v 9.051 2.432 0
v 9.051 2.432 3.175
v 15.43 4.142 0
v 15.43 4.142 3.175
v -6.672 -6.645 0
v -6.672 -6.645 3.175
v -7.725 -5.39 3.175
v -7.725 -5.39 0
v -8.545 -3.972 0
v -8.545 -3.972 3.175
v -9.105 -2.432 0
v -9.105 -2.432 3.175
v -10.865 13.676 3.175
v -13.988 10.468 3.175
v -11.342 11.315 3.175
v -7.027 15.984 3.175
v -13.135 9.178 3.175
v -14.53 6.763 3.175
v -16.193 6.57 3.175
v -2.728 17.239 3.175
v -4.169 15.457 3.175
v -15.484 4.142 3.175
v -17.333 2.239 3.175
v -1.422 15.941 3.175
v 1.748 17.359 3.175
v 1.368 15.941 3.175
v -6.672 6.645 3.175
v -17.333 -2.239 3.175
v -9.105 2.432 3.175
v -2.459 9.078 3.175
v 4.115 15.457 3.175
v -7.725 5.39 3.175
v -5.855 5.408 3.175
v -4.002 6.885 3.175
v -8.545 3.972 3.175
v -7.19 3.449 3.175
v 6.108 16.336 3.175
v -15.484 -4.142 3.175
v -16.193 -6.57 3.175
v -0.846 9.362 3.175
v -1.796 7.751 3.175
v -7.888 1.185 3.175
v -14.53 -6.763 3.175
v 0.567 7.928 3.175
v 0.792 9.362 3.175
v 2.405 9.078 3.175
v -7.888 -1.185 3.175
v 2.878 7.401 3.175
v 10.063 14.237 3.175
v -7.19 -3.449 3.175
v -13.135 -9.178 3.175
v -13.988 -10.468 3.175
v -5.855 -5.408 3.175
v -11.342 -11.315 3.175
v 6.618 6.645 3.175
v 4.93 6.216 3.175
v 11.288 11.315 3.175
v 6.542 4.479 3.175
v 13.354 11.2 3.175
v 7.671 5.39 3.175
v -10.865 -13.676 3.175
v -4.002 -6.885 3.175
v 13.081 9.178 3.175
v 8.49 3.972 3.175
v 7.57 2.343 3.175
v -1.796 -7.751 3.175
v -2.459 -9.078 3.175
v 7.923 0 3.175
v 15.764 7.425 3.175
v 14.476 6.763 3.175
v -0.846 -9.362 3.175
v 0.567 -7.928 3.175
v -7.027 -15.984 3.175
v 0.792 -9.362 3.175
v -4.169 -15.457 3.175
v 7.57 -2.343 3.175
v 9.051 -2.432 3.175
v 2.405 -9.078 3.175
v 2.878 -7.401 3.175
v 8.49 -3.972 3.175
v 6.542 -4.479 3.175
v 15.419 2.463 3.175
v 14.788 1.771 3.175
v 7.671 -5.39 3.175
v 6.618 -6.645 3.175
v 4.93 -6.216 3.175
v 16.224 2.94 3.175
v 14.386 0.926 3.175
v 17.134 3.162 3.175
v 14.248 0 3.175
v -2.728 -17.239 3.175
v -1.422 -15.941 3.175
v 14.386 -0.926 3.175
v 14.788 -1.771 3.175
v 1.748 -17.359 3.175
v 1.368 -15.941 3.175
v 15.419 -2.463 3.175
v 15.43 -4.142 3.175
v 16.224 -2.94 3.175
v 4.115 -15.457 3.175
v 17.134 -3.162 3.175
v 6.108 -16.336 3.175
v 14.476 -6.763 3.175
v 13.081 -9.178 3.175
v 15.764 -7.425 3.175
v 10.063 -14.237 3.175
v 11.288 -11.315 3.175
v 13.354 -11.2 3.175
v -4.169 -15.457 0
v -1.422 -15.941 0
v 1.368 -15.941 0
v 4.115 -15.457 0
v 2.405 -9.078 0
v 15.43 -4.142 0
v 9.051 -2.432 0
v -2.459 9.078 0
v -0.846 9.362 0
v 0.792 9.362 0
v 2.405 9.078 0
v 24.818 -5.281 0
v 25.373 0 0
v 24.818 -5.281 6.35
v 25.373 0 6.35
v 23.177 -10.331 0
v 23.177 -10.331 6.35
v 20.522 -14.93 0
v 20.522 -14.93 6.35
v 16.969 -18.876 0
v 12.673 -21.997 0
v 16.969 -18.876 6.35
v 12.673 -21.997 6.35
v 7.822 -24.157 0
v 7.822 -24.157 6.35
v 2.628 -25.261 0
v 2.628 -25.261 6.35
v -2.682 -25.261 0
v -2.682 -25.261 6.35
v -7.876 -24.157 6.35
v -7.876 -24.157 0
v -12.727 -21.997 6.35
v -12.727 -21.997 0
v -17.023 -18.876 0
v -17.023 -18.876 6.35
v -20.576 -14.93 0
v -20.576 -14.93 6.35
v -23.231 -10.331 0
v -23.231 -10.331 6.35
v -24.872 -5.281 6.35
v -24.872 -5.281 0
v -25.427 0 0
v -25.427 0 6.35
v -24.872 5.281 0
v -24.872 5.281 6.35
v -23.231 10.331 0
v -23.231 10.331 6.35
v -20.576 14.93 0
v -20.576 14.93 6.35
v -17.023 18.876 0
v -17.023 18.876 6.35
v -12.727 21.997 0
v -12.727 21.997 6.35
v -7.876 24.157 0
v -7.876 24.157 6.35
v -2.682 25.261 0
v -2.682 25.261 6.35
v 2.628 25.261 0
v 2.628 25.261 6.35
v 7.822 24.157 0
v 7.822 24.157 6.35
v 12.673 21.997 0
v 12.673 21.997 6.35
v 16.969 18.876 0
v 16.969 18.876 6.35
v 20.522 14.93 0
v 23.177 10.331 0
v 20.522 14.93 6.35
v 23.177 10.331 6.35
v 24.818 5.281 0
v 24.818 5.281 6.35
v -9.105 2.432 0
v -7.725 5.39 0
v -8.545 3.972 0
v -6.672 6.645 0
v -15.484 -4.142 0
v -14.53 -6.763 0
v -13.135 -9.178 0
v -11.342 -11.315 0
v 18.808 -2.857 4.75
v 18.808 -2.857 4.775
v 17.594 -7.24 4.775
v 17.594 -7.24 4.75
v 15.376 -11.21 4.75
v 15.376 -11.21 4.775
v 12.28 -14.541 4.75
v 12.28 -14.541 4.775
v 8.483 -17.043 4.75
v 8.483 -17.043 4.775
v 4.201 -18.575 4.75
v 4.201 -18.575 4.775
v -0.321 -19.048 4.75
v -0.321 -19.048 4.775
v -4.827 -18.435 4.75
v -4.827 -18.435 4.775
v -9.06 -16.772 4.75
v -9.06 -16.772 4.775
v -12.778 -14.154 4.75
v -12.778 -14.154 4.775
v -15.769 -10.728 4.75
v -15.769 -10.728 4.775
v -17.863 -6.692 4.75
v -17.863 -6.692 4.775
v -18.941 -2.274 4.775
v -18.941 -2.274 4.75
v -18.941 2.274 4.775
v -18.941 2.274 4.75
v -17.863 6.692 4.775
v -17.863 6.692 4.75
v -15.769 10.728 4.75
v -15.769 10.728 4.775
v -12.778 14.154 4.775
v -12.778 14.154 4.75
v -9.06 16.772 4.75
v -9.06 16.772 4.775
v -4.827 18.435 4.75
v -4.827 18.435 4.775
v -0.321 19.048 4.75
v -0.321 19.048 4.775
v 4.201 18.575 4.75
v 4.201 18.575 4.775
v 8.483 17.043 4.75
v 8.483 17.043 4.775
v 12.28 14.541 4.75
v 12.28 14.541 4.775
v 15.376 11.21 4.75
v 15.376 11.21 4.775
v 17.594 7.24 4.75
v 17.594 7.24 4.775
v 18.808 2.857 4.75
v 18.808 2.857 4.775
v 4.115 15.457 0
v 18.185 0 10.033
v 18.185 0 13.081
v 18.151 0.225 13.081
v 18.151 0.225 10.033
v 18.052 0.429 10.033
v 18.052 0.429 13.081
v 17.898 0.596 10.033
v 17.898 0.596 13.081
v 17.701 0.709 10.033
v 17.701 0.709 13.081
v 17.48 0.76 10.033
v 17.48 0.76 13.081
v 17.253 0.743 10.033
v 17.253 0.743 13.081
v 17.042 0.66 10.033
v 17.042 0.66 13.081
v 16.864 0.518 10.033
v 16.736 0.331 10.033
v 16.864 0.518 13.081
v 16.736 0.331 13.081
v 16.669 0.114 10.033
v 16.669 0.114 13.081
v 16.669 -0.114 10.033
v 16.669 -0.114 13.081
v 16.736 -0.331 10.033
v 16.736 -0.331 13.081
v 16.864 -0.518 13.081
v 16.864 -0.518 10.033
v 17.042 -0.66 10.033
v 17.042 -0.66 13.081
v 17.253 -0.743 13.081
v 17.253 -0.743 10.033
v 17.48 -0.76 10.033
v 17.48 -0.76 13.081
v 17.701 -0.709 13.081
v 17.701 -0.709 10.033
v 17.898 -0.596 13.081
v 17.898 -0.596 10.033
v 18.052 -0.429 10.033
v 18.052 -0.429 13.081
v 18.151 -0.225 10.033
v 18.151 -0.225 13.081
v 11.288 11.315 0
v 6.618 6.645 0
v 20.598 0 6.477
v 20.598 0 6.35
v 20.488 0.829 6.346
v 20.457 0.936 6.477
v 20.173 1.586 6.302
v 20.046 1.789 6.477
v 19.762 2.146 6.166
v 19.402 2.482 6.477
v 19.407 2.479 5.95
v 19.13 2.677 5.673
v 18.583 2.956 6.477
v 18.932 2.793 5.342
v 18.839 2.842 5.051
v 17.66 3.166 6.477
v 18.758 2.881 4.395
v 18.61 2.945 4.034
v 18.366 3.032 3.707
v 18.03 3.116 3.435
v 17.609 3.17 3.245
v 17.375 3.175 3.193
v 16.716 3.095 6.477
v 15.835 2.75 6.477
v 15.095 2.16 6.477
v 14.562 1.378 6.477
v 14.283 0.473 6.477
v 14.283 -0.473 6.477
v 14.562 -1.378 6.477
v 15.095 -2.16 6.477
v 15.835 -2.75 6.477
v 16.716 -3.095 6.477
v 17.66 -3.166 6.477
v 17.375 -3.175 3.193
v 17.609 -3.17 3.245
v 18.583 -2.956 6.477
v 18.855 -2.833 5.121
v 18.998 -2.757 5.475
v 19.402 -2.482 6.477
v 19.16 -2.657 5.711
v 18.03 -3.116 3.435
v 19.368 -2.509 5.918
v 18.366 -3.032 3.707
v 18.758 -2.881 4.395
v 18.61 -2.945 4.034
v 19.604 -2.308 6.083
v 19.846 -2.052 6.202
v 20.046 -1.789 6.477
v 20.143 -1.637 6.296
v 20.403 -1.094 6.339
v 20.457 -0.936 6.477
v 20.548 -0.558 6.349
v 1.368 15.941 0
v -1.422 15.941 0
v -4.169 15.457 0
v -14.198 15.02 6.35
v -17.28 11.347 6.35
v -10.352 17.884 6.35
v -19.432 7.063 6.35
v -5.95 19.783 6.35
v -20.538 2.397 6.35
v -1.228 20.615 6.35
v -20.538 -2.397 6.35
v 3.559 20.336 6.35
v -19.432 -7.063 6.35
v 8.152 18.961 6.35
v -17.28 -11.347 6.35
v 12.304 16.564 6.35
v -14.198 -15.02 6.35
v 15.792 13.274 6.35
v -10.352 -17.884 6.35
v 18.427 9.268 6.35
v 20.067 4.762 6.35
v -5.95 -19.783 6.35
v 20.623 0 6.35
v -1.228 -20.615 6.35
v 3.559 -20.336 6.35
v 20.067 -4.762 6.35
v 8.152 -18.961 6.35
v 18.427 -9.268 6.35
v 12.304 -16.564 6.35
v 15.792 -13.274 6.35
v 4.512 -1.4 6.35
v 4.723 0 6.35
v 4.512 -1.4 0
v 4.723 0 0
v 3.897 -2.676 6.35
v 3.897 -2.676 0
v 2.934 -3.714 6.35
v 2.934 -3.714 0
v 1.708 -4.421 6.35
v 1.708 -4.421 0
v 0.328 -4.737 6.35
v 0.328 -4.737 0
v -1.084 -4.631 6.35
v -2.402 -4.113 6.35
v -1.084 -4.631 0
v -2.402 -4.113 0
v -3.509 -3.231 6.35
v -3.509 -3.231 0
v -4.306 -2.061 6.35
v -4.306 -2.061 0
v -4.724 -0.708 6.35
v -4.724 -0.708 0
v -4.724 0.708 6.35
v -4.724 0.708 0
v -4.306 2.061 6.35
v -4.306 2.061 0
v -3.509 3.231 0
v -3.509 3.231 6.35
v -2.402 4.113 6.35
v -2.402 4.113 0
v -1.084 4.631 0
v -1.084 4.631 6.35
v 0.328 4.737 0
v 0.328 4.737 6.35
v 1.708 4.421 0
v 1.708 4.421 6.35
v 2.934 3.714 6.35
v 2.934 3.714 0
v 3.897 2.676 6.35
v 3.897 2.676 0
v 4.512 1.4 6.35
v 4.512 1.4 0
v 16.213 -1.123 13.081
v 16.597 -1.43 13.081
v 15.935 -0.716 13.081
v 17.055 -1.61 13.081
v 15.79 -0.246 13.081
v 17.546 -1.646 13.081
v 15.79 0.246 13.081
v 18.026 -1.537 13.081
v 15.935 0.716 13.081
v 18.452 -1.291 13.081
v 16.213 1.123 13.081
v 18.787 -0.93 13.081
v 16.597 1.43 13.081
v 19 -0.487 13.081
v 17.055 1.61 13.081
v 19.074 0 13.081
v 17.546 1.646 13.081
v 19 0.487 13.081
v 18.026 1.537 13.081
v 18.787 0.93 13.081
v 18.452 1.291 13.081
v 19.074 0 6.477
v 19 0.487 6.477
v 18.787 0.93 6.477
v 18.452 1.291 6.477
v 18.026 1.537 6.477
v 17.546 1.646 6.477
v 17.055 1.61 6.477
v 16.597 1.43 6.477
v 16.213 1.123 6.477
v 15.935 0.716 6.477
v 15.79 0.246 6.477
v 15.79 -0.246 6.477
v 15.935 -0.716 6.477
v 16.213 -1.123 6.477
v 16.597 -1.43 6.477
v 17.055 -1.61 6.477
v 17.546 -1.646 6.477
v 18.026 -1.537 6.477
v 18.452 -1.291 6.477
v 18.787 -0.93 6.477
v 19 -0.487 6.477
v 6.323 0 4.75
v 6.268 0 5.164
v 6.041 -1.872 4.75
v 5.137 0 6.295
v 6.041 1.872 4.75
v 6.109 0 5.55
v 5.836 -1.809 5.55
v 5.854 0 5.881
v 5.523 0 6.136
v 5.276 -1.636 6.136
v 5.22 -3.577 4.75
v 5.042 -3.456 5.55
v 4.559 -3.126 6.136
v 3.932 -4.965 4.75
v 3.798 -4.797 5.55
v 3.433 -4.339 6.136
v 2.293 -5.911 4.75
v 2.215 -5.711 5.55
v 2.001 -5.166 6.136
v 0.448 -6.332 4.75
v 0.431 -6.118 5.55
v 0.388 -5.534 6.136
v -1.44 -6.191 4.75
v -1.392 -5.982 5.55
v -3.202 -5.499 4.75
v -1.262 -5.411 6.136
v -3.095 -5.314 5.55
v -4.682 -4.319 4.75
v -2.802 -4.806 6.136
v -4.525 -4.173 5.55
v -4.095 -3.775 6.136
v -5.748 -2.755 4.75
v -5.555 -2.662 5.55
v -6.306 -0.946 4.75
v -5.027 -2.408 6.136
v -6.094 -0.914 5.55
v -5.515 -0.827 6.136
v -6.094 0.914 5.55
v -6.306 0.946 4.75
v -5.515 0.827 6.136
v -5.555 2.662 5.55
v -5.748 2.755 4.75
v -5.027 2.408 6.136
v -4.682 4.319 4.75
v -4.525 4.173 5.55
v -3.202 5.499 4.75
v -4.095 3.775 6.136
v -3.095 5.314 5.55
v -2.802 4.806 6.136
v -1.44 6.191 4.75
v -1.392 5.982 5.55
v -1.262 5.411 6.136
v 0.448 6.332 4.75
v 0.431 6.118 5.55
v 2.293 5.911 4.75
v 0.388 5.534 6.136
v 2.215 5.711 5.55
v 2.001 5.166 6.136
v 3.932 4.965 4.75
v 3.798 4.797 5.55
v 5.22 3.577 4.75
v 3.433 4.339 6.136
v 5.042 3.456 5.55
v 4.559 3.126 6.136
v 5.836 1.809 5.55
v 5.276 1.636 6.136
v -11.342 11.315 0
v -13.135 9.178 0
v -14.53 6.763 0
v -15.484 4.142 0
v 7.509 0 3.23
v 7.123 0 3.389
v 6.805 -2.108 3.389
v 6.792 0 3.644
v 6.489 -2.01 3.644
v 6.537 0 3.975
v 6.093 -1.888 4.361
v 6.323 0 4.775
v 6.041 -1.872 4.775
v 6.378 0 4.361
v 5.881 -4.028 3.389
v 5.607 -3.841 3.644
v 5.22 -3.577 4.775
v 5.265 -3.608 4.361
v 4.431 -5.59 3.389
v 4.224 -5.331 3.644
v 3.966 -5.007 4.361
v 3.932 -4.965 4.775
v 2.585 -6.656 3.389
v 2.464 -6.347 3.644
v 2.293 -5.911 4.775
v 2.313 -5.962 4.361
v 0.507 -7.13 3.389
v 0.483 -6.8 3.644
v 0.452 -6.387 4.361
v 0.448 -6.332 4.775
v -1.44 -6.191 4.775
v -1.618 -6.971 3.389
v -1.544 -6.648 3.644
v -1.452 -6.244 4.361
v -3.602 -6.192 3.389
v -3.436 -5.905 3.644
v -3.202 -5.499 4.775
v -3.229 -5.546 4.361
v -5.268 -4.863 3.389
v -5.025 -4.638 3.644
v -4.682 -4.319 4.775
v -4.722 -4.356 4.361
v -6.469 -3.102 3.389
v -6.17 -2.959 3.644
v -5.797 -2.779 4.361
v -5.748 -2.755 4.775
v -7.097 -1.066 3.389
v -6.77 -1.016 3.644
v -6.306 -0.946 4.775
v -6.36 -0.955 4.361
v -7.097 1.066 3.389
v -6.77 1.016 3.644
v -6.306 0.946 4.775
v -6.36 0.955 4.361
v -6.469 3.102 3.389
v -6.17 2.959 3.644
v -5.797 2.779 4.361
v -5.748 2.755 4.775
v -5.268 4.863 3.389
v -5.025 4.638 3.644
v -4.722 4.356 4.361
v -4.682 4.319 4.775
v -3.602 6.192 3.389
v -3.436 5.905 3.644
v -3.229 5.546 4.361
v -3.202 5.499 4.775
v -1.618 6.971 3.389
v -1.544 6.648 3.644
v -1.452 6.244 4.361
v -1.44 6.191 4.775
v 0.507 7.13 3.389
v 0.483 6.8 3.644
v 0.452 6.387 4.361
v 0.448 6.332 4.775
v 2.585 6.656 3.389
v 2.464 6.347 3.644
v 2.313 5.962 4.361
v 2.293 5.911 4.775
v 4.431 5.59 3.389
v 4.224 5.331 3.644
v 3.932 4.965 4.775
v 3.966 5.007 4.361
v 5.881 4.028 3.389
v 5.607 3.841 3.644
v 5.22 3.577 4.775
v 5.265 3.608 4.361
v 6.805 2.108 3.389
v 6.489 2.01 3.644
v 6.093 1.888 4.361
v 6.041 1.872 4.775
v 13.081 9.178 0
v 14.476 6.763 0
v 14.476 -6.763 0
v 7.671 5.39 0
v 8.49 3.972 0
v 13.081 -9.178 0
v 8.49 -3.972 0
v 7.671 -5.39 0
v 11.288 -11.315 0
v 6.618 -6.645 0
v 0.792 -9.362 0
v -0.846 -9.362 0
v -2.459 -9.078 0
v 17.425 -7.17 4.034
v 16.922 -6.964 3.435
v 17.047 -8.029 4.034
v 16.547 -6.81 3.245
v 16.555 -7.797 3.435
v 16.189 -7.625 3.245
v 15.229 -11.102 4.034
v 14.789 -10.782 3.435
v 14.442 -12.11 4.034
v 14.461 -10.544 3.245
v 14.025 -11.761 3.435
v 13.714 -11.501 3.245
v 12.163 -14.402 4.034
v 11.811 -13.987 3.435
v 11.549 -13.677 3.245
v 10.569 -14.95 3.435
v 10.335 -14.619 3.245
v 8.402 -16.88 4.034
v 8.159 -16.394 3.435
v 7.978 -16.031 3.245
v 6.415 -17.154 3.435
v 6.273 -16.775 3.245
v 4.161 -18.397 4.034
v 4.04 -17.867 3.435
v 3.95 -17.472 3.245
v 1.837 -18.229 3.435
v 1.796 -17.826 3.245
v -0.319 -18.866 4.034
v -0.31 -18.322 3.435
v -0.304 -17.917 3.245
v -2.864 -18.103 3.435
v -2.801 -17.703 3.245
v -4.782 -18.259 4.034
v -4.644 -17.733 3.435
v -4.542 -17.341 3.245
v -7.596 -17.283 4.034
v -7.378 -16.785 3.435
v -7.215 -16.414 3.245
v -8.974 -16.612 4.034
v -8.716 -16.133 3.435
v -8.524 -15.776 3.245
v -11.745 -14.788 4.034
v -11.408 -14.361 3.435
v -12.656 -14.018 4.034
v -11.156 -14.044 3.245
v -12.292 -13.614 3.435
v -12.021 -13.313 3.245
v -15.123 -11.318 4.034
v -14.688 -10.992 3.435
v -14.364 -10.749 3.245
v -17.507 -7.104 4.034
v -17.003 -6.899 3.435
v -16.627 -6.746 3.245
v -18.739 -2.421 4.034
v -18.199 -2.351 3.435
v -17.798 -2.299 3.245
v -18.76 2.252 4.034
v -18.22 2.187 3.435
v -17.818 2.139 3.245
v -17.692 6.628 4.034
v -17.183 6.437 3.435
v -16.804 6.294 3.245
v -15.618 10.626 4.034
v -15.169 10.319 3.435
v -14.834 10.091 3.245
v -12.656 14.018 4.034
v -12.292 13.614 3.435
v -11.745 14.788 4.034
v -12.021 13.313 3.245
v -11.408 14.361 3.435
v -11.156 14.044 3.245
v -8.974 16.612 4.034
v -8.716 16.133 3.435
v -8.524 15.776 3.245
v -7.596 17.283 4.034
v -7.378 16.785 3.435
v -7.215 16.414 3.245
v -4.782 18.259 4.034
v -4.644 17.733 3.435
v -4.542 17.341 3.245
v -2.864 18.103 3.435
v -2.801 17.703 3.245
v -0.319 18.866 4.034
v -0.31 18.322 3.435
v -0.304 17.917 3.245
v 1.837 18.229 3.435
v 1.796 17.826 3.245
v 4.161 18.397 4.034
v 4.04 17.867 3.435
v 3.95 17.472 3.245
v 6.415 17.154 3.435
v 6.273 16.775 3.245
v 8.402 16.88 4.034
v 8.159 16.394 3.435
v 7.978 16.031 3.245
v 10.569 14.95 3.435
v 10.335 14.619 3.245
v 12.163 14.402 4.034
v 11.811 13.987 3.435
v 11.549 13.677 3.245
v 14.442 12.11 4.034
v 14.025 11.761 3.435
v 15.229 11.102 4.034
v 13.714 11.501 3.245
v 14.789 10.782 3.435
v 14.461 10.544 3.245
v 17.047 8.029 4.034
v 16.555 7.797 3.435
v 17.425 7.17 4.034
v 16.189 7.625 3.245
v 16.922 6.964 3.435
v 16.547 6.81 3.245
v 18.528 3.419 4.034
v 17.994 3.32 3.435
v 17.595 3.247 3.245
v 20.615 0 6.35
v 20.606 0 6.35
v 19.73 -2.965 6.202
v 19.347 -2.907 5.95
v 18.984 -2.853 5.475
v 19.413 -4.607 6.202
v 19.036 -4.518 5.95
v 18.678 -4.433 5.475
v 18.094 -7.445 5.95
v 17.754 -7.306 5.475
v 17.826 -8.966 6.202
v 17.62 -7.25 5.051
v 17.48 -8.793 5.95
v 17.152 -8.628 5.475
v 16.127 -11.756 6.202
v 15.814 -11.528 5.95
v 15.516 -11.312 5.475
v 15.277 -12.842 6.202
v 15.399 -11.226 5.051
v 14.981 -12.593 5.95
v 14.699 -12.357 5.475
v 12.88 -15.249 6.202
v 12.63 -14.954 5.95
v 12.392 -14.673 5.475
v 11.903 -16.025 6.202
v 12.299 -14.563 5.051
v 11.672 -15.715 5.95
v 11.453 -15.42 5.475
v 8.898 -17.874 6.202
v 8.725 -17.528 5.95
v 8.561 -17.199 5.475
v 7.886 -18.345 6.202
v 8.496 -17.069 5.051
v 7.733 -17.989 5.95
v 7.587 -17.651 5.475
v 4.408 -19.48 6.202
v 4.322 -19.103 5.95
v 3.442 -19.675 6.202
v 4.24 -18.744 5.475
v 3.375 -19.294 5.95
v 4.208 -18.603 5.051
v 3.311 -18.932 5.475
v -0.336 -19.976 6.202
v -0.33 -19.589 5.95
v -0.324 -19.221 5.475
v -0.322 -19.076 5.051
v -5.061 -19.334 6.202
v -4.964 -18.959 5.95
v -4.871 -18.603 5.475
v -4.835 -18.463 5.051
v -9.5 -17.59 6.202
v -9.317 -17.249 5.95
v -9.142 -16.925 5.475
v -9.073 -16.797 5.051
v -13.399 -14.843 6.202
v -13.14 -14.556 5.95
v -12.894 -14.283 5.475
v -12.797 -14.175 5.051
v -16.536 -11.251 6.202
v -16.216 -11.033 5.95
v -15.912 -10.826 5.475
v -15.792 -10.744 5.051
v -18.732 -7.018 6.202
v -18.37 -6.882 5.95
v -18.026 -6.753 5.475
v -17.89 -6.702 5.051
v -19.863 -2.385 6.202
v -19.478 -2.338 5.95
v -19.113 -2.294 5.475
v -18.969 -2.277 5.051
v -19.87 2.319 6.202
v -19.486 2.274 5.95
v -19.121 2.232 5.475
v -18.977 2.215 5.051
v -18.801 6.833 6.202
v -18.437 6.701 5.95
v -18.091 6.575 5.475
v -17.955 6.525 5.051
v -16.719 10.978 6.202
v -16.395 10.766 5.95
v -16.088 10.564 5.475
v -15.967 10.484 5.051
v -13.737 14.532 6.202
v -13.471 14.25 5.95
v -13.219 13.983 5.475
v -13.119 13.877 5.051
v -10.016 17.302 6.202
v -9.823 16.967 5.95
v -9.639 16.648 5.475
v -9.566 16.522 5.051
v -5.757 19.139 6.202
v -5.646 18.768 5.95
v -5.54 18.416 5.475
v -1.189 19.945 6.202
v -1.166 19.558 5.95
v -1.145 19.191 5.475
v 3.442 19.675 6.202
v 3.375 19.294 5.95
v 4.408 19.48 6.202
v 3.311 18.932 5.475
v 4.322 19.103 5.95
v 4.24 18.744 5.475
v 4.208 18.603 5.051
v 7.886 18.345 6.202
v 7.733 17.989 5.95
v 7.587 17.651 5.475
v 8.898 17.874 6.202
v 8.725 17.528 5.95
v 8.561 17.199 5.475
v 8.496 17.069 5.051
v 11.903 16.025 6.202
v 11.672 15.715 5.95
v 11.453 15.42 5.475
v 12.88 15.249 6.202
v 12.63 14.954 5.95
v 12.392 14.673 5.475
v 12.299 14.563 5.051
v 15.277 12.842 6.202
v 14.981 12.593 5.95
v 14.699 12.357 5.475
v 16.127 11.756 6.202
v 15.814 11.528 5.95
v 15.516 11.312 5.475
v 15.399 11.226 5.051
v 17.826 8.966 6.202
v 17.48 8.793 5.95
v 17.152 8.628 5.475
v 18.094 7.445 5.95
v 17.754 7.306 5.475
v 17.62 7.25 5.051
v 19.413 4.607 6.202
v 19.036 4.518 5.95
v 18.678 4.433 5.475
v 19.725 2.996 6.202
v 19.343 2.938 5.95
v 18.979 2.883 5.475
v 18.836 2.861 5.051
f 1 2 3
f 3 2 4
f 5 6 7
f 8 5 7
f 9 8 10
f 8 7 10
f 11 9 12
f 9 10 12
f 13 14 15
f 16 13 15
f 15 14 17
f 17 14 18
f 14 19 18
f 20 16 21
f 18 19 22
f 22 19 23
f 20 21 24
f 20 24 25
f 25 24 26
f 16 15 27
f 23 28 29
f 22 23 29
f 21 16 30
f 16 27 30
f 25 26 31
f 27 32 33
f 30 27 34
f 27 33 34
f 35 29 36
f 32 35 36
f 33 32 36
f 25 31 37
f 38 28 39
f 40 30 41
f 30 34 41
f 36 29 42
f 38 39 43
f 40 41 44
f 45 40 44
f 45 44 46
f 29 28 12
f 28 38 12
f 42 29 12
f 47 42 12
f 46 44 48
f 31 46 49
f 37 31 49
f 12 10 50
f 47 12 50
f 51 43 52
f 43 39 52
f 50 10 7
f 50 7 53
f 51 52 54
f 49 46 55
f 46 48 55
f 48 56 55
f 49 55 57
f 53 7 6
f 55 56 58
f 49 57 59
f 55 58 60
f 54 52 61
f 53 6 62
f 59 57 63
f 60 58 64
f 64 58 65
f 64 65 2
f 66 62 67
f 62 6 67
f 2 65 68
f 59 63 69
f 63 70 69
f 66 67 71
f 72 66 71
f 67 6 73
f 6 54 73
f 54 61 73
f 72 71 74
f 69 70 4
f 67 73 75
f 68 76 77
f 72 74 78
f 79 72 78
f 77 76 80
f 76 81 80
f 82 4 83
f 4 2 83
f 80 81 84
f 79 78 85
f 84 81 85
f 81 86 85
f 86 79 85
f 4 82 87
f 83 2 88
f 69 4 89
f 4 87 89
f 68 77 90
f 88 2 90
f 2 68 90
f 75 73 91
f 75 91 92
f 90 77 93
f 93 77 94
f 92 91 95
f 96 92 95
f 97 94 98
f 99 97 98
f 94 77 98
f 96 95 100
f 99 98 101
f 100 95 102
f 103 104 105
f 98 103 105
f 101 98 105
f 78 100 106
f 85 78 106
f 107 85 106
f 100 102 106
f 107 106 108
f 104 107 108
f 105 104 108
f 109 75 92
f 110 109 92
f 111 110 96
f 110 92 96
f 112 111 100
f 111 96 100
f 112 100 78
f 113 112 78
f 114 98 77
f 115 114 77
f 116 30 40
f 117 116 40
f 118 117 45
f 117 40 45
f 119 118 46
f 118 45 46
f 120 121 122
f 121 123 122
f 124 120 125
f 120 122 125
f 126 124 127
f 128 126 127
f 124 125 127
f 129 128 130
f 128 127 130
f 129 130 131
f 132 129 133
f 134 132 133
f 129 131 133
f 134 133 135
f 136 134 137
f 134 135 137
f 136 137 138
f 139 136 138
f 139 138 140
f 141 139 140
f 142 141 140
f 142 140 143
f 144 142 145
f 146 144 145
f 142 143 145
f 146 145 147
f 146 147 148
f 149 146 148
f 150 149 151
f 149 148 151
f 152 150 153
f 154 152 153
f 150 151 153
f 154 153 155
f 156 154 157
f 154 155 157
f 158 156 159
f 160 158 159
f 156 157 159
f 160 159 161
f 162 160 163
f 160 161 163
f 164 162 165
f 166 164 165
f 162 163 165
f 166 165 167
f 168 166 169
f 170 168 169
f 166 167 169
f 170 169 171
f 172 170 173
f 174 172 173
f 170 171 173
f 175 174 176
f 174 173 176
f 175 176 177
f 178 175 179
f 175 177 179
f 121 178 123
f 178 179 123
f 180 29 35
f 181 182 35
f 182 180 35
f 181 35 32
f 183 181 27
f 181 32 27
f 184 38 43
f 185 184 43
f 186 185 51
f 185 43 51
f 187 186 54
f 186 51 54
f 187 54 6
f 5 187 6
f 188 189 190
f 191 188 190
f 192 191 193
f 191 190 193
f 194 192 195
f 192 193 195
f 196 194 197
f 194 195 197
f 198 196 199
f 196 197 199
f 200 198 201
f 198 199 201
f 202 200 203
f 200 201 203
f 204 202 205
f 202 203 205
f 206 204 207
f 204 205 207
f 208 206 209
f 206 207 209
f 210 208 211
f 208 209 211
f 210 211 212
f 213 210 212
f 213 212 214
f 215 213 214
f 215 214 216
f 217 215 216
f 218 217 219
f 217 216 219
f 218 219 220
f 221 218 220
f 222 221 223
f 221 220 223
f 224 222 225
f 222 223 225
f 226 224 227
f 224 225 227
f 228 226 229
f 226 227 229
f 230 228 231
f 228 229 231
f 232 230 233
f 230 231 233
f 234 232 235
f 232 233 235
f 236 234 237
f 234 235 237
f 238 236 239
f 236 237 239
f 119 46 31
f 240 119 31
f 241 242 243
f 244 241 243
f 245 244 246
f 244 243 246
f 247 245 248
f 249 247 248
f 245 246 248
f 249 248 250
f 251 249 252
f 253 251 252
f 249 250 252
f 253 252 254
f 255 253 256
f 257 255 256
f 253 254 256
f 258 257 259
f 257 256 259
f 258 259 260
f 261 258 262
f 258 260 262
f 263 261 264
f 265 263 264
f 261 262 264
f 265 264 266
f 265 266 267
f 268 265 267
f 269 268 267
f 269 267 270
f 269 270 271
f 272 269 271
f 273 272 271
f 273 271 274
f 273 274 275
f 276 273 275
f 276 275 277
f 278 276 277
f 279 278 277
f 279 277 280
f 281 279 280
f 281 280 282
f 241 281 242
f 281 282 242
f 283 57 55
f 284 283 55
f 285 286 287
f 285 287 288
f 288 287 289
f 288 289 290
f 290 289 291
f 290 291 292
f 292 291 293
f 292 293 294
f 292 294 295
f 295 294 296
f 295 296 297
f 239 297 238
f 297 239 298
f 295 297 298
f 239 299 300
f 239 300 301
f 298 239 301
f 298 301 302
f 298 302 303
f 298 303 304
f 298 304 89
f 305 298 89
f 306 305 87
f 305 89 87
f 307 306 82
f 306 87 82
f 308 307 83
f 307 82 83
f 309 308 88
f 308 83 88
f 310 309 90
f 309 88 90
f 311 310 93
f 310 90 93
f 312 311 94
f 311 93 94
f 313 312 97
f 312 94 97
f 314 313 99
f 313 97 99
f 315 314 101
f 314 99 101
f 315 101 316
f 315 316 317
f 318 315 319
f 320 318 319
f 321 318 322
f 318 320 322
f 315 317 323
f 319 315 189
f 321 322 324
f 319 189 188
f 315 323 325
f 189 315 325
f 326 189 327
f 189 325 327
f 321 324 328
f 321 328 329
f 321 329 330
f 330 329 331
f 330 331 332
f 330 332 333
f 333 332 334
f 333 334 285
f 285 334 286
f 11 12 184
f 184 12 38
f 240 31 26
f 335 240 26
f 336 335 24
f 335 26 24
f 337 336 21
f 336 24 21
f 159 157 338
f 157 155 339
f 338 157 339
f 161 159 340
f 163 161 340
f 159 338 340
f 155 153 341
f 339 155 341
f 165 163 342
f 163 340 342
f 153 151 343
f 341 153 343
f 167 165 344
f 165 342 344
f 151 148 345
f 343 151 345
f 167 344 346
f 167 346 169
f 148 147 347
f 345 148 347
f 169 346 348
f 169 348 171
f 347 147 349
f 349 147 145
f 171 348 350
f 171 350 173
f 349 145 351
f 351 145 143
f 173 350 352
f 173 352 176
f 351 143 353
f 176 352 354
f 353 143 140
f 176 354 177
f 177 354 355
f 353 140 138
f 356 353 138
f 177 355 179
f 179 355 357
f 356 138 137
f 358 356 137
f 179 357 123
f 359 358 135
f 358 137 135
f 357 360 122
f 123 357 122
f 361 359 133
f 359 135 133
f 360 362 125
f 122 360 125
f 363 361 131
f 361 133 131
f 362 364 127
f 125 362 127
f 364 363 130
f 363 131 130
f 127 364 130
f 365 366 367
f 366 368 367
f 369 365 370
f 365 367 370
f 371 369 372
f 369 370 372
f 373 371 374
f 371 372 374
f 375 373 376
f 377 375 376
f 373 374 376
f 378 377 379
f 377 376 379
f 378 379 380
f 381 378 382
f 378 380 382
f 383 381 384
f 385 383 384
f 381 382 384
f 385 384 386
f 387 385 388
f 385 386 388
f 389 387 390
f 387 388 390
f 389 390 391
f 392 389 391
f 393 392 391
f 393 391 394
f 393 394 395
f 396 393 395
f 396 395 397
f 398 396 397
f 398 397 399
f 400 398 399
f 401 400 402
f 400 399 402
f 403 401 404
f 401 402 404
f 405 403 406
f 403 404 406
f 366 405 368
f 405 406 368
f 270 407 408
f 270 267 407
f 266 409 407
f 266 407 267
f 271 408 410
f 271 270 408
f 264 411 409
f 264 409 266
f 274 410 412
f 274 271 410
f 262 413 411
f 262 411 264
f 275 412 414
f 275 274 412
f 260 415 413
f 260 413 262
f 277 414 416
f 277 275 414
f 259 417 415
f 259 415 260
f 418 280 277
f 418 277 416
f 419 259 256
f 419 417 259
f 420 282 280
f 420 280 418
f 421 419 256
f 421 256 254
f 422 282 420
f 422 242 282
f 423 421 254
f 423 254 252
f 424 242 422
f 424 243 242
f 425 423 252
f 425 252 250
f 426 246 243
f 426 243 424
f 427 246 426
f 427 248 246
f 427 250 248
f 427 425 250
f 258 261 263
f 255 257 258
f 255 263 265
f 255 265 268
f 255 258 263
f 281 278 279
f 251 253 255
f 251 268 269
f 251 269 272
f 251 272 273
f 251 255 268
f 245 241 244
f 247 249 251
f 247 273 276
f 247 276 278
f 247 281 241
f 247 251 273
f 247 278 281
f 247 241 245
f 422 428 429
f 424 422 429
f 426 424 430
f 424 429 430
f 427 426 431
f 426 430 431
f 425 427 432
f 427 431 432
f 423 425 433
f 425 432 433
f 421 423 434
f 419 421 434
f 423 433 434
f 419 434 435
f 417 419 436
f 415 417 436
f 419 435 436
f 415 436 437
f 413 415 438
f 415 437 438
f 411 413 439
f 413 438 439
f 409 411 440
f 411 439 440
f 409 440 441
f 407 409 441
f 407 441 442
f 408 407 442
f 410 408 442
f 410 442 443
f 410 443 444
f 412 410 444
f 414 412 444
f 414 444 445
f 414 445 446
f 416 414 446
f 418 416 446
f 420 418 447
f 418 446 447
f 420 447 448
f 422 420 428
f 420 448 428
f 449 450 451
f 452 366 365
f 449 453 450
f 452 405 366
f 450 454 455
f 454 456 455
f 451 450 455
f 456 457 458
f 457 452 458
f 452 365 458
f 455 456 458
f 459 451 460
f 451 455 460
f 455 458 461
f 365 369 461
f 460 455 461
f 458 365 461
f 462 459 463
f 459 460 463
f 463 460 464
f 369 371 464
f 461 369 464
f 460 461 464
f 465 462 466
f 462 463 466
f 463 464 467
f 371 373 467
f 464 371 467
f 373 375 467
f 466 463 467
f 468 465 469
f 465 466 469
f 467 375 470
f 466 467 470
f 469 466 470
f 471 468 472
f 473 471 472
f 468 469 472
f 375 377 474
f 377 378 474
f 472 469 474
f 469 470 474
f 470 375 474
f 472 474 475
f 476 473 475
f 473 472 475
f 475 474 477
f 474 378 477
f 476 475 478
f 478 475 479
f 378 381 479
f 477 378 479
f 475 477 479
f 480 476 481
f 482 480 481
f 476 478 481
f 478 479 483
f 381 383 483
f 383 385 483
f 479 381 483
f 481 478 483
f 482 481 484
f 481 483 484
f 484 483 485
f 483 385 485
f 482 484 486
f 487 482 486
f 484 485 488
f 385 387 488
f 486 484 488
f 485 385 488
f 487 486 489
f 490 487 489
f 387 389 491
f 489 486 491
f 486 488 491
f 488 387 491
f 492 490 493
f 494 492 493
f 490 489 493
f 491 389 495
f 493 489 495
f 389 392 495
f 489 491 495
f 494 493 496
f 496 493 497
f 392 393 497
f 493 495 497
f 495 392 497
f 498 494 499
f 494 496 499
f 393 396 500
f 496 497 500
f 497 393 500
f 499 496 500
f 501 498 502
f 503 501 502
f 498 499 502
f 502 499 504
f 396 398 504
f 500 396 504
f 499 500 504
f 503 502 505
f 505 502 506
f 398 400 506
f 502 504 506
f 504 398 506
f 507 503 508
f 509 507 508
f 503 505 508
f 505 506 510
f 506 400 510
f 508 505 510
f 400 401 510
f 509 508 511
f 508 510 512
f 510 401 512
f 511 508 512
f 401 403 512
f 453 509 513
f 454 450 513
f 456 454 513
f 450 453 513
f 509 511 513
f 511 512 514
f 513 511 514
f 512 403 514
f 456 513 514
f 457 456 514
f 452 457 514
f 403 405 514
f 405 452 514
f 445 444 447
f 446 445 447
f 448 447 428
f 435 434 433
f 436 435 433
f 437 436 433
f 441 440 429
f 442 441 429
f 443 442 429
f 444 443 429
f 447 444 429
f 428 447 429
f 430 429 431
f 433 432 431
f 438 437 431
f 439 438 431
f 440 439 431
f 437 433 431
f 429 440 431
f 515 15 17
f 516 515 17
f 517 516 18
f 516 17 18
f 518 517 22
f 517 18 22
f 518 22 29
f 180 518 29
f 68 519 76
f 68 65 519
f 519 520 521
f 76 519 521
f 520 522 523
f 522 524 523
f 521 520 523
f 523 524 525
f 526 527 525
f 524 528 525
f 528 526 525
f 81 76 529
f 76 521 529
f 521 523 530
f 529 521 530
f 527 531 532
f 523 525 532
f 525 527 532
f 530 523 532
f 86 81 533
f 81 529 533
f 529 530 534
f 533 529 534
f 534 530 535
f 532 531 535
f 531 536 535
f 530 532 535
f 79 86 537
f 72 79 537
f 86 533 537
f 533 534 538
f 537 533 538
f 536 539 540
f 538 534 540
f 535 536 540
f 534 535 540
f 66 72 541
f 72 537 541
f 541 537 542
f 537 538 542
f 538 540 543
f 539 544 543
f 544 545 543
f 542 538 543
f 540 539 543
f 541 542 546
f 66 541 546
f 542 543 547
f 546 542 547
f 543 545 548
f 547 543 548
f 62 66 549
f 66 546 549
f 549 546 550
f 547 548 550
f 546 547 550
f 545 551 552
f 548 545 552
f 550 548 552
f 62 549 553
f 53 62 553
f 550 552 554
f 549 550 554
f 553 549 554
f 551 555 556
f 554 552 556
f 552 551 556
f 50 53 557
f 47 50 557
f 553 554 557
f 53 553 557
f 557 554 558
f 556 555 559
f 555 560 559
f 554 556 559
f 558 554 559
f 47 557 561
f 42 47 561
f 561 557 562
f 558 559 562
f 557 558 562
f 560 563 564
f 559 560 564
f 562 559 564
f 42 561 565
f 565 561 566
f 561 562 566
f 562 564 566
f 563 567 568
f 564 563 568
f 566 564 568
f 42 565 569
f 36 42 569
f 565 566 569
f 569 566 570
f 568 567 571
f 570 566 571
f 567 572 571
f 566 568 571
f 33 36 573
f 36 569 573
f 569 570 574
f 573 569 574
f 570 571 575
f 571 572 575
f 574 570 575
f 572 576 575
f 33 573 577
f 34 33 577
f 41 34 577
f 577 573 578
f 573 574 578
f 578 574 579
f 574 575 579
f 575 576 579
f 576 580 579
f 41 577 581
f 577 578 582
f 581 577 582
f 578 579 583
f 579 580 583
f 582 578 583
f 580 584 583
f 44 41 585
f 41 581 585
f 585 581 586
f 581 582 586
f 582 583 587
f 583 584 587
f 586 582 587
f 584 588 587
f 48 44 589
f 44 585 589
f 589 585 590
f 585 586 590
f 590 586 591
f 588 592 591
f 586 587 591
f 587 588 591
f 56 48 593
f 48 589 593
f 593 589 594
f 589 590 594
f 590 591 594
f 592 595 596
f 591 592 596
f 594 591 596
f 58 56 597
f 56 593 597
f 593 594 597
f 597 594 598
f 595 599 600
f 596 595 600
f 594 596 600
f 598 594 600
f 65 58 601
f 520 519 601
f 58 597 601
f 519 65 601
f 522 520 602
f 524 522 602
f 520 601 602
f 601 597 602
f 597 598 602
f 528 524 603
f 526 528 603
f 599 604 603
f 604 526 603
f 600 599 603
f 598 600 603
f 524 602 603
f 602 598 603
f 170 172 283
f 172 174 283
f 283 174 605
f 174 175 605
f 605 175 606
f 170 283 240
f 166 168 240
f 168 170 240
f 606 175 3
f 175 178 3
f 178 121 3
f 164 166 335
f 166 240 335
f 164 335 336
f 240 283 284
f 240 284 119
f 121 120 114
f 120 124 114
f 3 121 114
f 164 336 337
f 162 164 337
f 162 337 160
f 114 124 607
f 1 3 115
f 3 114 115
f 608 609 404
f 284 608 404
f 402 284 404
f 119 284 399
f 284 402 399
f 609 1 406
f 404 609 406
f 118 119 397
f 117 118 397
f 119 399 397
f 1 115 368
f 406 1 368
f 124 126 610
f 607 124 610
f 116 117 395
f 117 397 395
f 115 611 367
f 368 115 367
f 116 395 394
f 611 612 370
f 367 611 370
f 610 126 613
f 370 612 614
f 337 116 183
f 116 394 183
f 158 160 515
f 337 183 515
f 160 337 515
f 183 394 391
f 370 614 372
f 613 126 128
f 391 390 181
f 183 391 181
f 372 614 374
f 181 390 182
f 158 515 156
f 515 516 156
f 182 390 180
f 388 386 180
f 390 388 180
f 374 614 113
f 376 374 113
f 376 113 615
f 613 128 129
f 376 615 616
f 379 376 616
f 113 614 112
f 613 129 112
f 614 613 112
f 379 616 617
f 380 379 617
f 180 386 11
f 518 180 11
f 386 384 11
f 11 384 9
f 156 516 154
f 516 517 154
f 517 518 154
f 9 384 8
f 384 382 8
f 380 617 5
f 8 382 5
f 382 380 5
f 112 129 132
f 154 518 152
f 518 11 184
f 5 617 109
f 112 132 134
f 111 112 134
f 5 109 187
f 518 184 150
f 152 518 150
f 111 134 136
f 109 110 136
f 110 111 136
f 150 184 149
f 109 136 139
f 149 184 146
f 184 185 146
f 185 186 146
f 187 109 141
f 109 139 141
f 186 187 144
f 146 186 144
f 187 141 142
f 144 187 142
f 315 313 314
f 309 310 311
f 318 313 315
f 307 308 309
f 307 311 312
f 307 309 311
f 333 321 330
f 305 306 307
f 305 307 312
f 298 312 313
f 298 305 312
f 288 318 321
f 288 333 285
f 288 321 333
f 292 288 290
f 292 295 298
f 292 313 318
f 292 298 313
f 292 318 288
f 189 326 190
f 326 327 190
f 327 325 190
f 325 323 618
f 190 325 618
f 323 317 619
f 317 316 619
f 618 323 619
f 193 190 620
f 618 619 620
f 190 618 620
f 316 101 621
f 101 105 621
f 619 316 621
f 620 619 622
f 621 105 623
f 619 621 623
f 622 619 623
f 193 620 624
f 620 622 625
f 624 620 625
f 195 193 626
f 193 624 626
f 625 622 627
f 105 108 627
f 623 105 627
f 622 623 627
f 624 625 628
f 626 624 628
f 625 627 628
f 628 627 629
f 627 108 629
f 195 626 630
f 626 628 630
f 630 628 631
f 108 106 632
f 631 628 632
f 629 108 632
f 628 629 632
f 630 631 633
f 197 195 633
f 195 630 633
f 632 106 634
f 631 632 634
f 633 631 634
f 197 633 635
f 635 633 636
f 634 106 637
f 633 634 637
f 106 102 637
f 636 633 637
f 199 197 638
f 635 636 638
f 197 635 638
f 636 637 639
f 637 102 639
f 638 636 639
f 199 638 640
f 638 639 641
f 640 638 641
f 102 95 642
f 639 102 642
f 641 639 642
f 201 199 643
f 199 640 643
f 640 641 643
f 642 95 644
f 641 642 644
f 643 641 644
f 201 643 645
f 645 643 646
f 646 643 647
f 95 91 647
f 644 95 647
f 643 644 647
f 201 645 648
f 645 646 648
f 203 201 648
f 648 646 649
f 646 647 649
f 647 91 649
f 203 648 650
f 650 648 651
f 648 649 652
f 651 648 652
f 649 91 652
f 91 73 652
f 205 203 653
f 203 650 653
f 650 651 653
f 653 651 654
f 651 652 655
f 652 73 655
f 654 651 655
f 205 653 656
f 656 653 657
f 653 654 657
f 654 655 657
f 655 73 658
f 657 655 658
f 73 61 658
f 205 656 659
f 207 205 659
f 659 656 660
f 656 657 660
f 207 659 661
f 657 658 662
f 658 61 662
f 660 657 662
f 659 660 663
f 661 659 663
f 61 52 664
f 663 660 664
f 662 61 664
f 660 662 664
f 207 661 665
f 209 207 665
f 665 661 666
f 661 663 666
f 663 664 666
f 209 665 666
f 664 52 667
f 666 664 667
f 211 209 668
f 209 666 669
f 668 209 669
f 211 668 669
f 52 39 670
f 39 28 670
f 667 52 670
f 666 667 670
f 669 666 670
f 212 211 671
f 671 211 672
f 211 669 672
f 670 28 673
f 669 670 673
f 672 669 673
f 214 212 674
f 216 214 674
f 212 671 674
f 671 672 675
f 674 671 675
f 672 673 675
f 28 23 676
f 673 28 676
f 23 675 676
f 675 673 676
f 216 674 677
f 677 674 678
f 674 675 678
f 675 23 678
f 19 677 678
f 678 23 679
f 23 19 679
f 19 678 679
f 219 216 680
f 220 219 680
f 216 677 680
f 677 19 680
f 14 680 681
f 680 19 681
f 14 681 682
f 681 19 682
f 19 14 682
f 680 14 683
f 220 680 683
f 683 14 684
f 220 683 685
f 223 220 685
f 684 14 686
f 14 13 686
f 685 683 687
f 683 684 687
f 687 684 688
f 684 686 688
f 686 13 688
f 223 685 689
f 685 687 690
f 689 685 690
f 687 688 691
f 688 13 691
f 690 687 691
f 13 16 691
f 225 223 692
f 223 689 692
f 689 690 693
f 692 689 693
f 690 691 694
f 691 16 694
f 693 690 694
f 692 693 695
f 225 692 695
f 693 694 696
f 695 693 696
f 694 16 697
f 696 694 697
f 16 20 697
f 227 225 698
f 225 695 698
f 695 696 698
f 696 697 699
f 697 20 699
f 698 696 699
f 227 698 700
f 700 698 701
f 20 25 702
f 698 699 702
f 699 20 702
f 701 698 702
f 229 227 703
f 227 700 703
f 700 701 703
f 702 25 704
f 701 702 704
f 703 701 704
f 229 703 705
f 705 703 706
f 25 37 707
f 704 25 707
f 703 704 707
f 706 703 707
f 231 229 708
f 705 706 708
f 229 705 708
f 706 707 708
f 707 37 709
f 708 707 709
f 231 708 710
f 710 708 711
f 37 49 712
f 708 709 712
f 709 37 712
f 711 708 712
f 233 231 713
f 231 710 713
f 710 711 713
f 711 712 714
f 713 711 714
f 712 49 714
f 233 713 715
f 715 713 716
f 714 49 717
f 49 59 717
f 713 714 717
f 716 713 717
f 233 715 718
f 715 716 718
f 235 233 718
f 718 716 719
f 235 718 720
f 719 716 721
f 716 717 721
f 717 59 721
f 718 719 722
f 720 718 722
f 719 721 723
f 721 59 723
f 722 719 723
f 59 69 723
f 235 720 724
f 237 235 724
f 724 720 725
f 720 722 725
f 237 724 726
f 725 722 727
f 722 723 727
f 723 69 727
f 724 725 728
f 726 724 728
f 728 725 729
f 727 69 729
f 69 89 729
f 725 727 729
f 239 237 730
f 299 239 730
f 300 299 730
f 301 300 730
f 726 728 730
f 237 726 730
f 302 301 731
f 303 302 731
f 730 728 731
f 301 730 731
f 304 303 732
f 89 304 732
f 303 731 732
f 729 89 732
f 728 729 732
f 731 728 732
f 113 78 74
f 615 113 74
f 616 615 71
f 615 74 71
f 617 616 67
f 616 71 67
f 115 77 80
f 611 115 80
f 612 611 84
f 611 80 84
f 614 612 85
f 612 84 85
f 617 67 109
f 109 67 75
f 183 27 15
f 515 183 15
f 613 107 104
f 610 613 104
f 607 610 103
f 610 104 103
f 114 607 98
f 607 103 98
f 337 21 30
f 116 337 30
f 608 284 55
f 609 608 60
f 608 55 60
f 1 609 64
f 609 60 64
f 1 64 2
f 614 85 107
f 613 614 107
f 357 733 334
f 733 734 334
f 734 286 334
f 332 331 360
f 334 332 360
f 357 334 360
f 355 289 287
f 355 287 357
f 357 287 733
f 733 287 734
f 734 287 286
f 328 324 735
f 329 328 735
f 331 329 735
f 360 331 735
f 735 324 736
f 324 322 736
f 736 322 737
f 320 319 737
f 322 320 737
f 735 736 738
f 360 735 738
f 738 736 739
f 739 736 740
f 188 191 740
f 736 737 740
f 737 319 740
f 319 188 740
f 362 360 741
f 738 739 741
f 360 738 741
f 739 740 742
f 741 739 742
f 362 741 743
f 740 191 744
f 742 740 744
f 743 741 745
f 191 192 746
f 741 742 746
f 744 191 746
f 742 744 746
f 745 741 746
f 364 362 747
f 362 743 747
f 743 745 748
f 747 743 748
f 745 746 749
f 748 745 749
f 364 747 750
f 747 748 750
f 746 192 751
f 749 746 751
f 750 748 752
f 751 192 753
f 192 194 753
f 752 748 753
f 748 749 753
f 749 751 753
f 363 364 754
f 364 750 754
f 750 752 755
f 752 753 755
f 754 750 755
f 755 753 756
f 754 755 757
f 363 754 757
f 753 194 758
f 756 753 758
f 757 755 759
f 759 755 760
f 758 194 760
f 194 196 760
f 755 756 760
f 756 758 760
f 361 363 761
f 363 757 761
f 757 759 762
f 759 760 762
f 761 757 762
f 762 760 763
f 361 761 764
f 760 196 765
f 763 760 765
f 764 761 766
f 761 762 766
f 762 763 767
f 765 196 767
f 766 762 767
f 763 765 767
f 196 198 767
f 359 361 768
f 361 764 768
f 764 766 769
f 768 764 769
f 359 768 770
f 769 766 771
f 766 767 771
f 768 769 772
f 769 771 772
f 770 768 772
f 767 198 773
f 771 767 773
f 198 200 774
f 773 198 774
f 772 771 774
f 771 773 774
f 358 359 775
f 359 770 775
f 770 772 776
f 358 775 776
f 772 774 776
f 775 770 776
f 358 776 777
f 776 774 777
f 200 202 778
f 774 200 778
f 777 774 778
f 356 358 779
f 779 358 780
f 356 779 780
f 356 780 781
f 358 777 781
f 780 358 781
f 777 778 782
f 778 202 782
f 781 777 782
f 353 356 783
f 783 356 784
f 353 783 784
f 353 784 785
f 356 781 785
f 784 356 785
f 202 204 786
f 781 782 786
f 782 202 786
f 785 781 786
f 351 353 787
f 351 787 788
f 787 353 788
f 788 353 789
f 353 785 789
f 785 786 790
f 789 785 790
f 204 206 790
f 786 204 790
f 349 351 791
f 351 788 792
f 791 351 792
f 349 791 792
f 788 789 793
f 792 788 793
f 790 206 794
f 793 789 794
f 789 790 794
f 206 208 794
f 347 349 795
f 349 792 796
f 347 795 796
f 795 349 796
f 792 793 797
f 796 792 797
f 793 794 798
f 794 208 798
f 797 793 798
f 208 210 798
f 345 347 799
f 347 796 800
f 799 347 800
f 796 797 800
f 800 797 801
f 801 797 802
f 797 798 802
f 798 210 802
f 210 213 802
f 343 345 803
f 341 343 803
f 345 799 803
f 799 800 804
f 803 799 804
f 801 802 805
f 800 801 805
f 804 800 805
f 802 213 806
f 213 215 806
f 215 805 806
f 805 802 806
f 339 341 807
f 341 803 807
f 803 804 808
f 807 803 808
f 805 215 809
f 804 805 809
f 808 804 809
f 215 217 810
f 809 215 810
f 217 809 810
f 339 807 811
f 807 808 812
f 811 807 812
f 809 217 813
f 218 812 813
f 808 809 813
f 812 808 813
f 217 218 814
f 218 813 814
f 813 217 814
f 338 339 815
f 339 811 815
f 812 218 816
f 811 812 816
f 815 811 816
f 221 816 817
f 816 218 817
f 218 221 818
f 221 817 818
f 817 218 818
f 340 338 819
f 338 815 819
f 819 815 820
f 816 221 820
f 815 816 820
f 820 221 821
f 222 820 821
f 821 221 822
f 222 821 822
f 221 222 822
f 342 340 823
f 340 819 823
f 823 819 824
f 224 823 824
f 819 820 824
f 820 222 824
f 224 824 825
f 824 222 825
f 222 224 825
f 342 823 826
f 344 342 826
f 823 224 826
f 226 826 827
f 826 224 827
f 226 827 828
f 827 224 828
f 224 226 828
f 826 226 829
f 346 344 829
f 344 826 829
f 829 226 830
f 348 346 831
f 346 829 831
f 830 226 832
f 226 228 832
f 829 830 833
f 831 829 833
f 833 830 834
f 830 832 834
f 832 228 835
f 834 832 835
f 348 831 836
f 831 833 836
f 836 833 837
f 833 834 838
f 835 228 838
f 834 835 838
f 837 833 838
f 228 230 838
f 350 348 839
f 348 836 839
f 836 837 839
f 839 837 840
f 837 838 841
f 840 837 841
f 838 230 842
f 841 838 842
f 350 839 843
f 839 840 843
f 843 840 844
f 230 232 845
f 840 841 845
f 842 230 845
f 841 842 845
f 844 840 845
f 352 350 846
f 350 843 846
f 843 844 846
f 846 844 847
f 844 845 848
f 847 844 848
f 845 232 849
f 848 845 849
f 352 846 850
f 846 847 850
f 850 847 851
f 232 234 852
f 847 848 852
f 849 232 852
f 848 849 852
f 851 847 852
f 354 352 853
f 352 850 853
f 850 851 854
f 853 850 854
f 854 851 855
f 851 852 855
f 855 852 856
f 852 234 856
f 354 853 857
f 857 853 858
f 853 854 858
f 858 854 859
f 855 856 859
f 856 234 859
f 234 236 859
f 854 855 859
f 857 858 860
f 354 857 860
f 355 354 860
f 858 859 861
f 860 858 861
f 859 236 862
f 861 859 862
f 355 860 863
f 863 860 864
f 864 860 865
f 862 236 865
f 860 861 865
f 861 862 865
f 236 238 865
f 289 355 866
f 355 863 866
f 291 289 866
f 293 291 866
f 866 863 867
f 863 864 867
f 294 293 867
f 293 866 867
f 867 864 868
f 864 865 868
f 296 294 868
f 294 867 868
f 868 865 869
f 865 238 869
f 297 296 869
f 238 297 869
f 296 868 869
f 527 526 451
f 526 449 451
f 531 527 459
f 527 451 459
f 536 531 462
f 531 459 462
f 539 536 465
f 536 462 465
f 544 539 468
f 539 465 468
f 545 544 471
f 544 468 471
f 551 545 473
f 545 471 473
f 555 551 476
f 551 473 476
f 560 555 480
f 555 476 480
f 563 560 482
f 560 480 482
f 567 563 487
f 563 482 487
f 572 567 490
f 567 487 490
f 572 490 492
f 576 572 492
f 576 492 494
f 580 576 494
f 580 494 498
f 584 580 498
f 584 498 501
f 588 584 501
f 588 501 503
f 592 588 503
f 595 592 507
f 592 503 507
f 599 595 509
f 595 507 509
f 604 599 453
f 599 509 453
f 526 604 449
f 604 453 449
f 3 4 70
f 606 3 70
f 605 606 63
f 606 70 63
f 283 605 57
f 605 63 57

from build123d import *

# Parameters (mm, degrees)
F3_DEPTH  = 25.4
F5_R      = 3.175
F6_DEPTH  = 3.302
F7_R      = 1.651
F8_DEPTH  = 6.604
F9_R      = 0.762
F10_DEPTH = 3.048


with BuildPart() as f1:
    # F0 (on Front) → F1 (revolve)
    with BuildSketch(Plane.XZ):
        with BuildLine():
            Line((8.5327767238, 6.35), (8.5327767238, 0))
            Line((8.5327767238, 0), (29.1829767238, 0))
            Line((29.1829767238, 0), (29.1829767238, 6.35))
            Line((29.1829767238, 6.35), (24.4331767238, 6.35))
            ThreePointArc((24.4331767238, 6.35), (23.3016644525, 5.8813122713), (22.8329767238, 4.7498))
            Line((22.8329767238, 4.7498), (22.8329767238, 4.7752))
            ThreePointArc((22.8329767238, 4.7752), (22.364288995, 3.6436877287), (21.2327767238, 3.175))
            Line((21.2327767238, 3.175), (11.7331767238, 3.175))
            ThreePointArc((11.7331767238, 3.175), (10.6016644525, 3.6436877287), (10.1329767238, 4.7752))
            Line((10.1329767238, 4.7752), (10.1329767238, 4.7498))
            ThreePointArc((10.1329767238, 4.7498), (9.664288995, 5.8813122713), (8.5327767238, 6.35))
        make_face()
    revolve(axis=Axis((3.7829767238, 0, 2.3621032014), (0, 0, -1)))

    # F2 (on face) → F3 (cut)
    with BuildSketch(Plane.XY.offset(3.175)):
        with BuildLine():
            ThreePointArc((1.3505953379, 9.0777709155), (3.7829767238, 9.398), (6.2153581096, 9.0777709155))
            Line((6.2153581096, 9.0777709155), (7.9245990835, 15.4567450723))
            ThreePointArc((7.9245990835, 15.4567450723), (3.7829767238, 16.002), (-0.358645636, 15.4567450723))
            Line((-0.358645636, 15.4567450723), (1.3505953379, 9.0777709155))
        make_face()
        with BuildLine():
            Line((-2.8624128058, 6.6453895296), (-7.5321459888, 11.3151227125))
            ThreePointArc((-7.5321459888, 11.3151227125), (-10.0751617876, 8.001), (-11.6737683485, 4.1416223597))
            Line((-11.6737683485, 4.1416223597), (-5.2947941917, 2.4323813859))
            ThreePointArc((-5.2947941917, 2.4323813859), (-4.355930021, 4.699), (-2.8624128058, 6.6453895296))
        make_face()
        with BuildLine():
            Line((-5.2947941917, -2.4323813859), (-11.6737683485, -4.1416223597))
            ThreePointArc((-11.6737683485, -4.1416223597), (-10.0751617876, -8.001), (-7.5321459888, -11.3151227125))
            Line((-7.5321459888, -11.3151227125), (-2.8624128058, -6.6453895296))
            ThreePointArc((-2.8624128058, -6.6453895296), (-4.355930021, -4.699), (-5.2947941917, -2.4323813859))
        make_face()
        with BuildLine():
            Line((1.3505953379, -9.0777709155), (-0.358645636, -15.4567450723))
            ThreePointArc((-0.358645636, -15.4567450723), (3.7829767238, -16.002), (7.9245990835, -15.4567450723))
            Line((7.9245990835, -15.4567450723), (6.2153581096, -9.0777709155))
            ThreePointArc((6.2153581096, -9.0777709155), (3.7829767238, -9.398), (1.3505953379, -9.0777709155))
        make_face()
        with BuildLine():
            Line((10.4283662534, -6.6453895296), (15.0980994363, -11.3151227125))
            ThreePointArc((15.0980994363, -11.3151227125), (17.6411152351, -8.001), (19.239721796, -4.1416223597))
            Line((19.239721796, -4.1416223597), (12.8607476392, -2.4323813859))
            ThreePointArc((12.8607476392, -2.4323813859), (11.9218834685, -4.699), (10.4283662534, -6.6453895296))
        make_face()
        with BuildLine():
            Line((12.8607476392, 2.4323813859), (19.239721796, 4.1416223597))
            ThreePointArc((19.239721796, 4.1416223597), (17.6411152351, 8.001), (15.0980994363, 11.3151227125))
            Line((15.0980994363, 11.3151227125), (10.4283662534, 6.6453895296))
            ThreePointArc((10.4283662534, 6.6453895296), (11.9218834685, 4.699), (12.8607476392, 2.4323813859))
        make_face()
    extrude(amount=-F3_DEPTH, mode=Mode.SUBTRACT)


with BuildPart() as f1_1:
    # F4: moved
    add(f1.part.moved(Location((-3.81, 0, 0))))

    # F5 (on face) → F6 (join)
    with BuildSketch(Plane.XY.offset(3.175)):
        with Locations((17.4227767238, 0)):
            Circle(F5_R)
    extrude(amount=F6_DEPTH)


with BuildPart() as f8:
    # F7 (on face) → F8 (new body)
    with BuildSketch(Plane.XY.offset(6.477)):
        with Locations((17.4227767238, 0)):
            Circle(F7_R)
    extrude(amount=F8_DEPTH)

    # F9 (on face) → F10 (cut)
    with BuildSketch(Plane.XY.offset(13.081)):
        with Locations((17.4227767238, 0)):
            Circle(F9_R)
    extrude(amount=-F10_DEPTH, mode=Mode.SUBTRACT)


solid = Compound([f1_1.part, f8.part])
